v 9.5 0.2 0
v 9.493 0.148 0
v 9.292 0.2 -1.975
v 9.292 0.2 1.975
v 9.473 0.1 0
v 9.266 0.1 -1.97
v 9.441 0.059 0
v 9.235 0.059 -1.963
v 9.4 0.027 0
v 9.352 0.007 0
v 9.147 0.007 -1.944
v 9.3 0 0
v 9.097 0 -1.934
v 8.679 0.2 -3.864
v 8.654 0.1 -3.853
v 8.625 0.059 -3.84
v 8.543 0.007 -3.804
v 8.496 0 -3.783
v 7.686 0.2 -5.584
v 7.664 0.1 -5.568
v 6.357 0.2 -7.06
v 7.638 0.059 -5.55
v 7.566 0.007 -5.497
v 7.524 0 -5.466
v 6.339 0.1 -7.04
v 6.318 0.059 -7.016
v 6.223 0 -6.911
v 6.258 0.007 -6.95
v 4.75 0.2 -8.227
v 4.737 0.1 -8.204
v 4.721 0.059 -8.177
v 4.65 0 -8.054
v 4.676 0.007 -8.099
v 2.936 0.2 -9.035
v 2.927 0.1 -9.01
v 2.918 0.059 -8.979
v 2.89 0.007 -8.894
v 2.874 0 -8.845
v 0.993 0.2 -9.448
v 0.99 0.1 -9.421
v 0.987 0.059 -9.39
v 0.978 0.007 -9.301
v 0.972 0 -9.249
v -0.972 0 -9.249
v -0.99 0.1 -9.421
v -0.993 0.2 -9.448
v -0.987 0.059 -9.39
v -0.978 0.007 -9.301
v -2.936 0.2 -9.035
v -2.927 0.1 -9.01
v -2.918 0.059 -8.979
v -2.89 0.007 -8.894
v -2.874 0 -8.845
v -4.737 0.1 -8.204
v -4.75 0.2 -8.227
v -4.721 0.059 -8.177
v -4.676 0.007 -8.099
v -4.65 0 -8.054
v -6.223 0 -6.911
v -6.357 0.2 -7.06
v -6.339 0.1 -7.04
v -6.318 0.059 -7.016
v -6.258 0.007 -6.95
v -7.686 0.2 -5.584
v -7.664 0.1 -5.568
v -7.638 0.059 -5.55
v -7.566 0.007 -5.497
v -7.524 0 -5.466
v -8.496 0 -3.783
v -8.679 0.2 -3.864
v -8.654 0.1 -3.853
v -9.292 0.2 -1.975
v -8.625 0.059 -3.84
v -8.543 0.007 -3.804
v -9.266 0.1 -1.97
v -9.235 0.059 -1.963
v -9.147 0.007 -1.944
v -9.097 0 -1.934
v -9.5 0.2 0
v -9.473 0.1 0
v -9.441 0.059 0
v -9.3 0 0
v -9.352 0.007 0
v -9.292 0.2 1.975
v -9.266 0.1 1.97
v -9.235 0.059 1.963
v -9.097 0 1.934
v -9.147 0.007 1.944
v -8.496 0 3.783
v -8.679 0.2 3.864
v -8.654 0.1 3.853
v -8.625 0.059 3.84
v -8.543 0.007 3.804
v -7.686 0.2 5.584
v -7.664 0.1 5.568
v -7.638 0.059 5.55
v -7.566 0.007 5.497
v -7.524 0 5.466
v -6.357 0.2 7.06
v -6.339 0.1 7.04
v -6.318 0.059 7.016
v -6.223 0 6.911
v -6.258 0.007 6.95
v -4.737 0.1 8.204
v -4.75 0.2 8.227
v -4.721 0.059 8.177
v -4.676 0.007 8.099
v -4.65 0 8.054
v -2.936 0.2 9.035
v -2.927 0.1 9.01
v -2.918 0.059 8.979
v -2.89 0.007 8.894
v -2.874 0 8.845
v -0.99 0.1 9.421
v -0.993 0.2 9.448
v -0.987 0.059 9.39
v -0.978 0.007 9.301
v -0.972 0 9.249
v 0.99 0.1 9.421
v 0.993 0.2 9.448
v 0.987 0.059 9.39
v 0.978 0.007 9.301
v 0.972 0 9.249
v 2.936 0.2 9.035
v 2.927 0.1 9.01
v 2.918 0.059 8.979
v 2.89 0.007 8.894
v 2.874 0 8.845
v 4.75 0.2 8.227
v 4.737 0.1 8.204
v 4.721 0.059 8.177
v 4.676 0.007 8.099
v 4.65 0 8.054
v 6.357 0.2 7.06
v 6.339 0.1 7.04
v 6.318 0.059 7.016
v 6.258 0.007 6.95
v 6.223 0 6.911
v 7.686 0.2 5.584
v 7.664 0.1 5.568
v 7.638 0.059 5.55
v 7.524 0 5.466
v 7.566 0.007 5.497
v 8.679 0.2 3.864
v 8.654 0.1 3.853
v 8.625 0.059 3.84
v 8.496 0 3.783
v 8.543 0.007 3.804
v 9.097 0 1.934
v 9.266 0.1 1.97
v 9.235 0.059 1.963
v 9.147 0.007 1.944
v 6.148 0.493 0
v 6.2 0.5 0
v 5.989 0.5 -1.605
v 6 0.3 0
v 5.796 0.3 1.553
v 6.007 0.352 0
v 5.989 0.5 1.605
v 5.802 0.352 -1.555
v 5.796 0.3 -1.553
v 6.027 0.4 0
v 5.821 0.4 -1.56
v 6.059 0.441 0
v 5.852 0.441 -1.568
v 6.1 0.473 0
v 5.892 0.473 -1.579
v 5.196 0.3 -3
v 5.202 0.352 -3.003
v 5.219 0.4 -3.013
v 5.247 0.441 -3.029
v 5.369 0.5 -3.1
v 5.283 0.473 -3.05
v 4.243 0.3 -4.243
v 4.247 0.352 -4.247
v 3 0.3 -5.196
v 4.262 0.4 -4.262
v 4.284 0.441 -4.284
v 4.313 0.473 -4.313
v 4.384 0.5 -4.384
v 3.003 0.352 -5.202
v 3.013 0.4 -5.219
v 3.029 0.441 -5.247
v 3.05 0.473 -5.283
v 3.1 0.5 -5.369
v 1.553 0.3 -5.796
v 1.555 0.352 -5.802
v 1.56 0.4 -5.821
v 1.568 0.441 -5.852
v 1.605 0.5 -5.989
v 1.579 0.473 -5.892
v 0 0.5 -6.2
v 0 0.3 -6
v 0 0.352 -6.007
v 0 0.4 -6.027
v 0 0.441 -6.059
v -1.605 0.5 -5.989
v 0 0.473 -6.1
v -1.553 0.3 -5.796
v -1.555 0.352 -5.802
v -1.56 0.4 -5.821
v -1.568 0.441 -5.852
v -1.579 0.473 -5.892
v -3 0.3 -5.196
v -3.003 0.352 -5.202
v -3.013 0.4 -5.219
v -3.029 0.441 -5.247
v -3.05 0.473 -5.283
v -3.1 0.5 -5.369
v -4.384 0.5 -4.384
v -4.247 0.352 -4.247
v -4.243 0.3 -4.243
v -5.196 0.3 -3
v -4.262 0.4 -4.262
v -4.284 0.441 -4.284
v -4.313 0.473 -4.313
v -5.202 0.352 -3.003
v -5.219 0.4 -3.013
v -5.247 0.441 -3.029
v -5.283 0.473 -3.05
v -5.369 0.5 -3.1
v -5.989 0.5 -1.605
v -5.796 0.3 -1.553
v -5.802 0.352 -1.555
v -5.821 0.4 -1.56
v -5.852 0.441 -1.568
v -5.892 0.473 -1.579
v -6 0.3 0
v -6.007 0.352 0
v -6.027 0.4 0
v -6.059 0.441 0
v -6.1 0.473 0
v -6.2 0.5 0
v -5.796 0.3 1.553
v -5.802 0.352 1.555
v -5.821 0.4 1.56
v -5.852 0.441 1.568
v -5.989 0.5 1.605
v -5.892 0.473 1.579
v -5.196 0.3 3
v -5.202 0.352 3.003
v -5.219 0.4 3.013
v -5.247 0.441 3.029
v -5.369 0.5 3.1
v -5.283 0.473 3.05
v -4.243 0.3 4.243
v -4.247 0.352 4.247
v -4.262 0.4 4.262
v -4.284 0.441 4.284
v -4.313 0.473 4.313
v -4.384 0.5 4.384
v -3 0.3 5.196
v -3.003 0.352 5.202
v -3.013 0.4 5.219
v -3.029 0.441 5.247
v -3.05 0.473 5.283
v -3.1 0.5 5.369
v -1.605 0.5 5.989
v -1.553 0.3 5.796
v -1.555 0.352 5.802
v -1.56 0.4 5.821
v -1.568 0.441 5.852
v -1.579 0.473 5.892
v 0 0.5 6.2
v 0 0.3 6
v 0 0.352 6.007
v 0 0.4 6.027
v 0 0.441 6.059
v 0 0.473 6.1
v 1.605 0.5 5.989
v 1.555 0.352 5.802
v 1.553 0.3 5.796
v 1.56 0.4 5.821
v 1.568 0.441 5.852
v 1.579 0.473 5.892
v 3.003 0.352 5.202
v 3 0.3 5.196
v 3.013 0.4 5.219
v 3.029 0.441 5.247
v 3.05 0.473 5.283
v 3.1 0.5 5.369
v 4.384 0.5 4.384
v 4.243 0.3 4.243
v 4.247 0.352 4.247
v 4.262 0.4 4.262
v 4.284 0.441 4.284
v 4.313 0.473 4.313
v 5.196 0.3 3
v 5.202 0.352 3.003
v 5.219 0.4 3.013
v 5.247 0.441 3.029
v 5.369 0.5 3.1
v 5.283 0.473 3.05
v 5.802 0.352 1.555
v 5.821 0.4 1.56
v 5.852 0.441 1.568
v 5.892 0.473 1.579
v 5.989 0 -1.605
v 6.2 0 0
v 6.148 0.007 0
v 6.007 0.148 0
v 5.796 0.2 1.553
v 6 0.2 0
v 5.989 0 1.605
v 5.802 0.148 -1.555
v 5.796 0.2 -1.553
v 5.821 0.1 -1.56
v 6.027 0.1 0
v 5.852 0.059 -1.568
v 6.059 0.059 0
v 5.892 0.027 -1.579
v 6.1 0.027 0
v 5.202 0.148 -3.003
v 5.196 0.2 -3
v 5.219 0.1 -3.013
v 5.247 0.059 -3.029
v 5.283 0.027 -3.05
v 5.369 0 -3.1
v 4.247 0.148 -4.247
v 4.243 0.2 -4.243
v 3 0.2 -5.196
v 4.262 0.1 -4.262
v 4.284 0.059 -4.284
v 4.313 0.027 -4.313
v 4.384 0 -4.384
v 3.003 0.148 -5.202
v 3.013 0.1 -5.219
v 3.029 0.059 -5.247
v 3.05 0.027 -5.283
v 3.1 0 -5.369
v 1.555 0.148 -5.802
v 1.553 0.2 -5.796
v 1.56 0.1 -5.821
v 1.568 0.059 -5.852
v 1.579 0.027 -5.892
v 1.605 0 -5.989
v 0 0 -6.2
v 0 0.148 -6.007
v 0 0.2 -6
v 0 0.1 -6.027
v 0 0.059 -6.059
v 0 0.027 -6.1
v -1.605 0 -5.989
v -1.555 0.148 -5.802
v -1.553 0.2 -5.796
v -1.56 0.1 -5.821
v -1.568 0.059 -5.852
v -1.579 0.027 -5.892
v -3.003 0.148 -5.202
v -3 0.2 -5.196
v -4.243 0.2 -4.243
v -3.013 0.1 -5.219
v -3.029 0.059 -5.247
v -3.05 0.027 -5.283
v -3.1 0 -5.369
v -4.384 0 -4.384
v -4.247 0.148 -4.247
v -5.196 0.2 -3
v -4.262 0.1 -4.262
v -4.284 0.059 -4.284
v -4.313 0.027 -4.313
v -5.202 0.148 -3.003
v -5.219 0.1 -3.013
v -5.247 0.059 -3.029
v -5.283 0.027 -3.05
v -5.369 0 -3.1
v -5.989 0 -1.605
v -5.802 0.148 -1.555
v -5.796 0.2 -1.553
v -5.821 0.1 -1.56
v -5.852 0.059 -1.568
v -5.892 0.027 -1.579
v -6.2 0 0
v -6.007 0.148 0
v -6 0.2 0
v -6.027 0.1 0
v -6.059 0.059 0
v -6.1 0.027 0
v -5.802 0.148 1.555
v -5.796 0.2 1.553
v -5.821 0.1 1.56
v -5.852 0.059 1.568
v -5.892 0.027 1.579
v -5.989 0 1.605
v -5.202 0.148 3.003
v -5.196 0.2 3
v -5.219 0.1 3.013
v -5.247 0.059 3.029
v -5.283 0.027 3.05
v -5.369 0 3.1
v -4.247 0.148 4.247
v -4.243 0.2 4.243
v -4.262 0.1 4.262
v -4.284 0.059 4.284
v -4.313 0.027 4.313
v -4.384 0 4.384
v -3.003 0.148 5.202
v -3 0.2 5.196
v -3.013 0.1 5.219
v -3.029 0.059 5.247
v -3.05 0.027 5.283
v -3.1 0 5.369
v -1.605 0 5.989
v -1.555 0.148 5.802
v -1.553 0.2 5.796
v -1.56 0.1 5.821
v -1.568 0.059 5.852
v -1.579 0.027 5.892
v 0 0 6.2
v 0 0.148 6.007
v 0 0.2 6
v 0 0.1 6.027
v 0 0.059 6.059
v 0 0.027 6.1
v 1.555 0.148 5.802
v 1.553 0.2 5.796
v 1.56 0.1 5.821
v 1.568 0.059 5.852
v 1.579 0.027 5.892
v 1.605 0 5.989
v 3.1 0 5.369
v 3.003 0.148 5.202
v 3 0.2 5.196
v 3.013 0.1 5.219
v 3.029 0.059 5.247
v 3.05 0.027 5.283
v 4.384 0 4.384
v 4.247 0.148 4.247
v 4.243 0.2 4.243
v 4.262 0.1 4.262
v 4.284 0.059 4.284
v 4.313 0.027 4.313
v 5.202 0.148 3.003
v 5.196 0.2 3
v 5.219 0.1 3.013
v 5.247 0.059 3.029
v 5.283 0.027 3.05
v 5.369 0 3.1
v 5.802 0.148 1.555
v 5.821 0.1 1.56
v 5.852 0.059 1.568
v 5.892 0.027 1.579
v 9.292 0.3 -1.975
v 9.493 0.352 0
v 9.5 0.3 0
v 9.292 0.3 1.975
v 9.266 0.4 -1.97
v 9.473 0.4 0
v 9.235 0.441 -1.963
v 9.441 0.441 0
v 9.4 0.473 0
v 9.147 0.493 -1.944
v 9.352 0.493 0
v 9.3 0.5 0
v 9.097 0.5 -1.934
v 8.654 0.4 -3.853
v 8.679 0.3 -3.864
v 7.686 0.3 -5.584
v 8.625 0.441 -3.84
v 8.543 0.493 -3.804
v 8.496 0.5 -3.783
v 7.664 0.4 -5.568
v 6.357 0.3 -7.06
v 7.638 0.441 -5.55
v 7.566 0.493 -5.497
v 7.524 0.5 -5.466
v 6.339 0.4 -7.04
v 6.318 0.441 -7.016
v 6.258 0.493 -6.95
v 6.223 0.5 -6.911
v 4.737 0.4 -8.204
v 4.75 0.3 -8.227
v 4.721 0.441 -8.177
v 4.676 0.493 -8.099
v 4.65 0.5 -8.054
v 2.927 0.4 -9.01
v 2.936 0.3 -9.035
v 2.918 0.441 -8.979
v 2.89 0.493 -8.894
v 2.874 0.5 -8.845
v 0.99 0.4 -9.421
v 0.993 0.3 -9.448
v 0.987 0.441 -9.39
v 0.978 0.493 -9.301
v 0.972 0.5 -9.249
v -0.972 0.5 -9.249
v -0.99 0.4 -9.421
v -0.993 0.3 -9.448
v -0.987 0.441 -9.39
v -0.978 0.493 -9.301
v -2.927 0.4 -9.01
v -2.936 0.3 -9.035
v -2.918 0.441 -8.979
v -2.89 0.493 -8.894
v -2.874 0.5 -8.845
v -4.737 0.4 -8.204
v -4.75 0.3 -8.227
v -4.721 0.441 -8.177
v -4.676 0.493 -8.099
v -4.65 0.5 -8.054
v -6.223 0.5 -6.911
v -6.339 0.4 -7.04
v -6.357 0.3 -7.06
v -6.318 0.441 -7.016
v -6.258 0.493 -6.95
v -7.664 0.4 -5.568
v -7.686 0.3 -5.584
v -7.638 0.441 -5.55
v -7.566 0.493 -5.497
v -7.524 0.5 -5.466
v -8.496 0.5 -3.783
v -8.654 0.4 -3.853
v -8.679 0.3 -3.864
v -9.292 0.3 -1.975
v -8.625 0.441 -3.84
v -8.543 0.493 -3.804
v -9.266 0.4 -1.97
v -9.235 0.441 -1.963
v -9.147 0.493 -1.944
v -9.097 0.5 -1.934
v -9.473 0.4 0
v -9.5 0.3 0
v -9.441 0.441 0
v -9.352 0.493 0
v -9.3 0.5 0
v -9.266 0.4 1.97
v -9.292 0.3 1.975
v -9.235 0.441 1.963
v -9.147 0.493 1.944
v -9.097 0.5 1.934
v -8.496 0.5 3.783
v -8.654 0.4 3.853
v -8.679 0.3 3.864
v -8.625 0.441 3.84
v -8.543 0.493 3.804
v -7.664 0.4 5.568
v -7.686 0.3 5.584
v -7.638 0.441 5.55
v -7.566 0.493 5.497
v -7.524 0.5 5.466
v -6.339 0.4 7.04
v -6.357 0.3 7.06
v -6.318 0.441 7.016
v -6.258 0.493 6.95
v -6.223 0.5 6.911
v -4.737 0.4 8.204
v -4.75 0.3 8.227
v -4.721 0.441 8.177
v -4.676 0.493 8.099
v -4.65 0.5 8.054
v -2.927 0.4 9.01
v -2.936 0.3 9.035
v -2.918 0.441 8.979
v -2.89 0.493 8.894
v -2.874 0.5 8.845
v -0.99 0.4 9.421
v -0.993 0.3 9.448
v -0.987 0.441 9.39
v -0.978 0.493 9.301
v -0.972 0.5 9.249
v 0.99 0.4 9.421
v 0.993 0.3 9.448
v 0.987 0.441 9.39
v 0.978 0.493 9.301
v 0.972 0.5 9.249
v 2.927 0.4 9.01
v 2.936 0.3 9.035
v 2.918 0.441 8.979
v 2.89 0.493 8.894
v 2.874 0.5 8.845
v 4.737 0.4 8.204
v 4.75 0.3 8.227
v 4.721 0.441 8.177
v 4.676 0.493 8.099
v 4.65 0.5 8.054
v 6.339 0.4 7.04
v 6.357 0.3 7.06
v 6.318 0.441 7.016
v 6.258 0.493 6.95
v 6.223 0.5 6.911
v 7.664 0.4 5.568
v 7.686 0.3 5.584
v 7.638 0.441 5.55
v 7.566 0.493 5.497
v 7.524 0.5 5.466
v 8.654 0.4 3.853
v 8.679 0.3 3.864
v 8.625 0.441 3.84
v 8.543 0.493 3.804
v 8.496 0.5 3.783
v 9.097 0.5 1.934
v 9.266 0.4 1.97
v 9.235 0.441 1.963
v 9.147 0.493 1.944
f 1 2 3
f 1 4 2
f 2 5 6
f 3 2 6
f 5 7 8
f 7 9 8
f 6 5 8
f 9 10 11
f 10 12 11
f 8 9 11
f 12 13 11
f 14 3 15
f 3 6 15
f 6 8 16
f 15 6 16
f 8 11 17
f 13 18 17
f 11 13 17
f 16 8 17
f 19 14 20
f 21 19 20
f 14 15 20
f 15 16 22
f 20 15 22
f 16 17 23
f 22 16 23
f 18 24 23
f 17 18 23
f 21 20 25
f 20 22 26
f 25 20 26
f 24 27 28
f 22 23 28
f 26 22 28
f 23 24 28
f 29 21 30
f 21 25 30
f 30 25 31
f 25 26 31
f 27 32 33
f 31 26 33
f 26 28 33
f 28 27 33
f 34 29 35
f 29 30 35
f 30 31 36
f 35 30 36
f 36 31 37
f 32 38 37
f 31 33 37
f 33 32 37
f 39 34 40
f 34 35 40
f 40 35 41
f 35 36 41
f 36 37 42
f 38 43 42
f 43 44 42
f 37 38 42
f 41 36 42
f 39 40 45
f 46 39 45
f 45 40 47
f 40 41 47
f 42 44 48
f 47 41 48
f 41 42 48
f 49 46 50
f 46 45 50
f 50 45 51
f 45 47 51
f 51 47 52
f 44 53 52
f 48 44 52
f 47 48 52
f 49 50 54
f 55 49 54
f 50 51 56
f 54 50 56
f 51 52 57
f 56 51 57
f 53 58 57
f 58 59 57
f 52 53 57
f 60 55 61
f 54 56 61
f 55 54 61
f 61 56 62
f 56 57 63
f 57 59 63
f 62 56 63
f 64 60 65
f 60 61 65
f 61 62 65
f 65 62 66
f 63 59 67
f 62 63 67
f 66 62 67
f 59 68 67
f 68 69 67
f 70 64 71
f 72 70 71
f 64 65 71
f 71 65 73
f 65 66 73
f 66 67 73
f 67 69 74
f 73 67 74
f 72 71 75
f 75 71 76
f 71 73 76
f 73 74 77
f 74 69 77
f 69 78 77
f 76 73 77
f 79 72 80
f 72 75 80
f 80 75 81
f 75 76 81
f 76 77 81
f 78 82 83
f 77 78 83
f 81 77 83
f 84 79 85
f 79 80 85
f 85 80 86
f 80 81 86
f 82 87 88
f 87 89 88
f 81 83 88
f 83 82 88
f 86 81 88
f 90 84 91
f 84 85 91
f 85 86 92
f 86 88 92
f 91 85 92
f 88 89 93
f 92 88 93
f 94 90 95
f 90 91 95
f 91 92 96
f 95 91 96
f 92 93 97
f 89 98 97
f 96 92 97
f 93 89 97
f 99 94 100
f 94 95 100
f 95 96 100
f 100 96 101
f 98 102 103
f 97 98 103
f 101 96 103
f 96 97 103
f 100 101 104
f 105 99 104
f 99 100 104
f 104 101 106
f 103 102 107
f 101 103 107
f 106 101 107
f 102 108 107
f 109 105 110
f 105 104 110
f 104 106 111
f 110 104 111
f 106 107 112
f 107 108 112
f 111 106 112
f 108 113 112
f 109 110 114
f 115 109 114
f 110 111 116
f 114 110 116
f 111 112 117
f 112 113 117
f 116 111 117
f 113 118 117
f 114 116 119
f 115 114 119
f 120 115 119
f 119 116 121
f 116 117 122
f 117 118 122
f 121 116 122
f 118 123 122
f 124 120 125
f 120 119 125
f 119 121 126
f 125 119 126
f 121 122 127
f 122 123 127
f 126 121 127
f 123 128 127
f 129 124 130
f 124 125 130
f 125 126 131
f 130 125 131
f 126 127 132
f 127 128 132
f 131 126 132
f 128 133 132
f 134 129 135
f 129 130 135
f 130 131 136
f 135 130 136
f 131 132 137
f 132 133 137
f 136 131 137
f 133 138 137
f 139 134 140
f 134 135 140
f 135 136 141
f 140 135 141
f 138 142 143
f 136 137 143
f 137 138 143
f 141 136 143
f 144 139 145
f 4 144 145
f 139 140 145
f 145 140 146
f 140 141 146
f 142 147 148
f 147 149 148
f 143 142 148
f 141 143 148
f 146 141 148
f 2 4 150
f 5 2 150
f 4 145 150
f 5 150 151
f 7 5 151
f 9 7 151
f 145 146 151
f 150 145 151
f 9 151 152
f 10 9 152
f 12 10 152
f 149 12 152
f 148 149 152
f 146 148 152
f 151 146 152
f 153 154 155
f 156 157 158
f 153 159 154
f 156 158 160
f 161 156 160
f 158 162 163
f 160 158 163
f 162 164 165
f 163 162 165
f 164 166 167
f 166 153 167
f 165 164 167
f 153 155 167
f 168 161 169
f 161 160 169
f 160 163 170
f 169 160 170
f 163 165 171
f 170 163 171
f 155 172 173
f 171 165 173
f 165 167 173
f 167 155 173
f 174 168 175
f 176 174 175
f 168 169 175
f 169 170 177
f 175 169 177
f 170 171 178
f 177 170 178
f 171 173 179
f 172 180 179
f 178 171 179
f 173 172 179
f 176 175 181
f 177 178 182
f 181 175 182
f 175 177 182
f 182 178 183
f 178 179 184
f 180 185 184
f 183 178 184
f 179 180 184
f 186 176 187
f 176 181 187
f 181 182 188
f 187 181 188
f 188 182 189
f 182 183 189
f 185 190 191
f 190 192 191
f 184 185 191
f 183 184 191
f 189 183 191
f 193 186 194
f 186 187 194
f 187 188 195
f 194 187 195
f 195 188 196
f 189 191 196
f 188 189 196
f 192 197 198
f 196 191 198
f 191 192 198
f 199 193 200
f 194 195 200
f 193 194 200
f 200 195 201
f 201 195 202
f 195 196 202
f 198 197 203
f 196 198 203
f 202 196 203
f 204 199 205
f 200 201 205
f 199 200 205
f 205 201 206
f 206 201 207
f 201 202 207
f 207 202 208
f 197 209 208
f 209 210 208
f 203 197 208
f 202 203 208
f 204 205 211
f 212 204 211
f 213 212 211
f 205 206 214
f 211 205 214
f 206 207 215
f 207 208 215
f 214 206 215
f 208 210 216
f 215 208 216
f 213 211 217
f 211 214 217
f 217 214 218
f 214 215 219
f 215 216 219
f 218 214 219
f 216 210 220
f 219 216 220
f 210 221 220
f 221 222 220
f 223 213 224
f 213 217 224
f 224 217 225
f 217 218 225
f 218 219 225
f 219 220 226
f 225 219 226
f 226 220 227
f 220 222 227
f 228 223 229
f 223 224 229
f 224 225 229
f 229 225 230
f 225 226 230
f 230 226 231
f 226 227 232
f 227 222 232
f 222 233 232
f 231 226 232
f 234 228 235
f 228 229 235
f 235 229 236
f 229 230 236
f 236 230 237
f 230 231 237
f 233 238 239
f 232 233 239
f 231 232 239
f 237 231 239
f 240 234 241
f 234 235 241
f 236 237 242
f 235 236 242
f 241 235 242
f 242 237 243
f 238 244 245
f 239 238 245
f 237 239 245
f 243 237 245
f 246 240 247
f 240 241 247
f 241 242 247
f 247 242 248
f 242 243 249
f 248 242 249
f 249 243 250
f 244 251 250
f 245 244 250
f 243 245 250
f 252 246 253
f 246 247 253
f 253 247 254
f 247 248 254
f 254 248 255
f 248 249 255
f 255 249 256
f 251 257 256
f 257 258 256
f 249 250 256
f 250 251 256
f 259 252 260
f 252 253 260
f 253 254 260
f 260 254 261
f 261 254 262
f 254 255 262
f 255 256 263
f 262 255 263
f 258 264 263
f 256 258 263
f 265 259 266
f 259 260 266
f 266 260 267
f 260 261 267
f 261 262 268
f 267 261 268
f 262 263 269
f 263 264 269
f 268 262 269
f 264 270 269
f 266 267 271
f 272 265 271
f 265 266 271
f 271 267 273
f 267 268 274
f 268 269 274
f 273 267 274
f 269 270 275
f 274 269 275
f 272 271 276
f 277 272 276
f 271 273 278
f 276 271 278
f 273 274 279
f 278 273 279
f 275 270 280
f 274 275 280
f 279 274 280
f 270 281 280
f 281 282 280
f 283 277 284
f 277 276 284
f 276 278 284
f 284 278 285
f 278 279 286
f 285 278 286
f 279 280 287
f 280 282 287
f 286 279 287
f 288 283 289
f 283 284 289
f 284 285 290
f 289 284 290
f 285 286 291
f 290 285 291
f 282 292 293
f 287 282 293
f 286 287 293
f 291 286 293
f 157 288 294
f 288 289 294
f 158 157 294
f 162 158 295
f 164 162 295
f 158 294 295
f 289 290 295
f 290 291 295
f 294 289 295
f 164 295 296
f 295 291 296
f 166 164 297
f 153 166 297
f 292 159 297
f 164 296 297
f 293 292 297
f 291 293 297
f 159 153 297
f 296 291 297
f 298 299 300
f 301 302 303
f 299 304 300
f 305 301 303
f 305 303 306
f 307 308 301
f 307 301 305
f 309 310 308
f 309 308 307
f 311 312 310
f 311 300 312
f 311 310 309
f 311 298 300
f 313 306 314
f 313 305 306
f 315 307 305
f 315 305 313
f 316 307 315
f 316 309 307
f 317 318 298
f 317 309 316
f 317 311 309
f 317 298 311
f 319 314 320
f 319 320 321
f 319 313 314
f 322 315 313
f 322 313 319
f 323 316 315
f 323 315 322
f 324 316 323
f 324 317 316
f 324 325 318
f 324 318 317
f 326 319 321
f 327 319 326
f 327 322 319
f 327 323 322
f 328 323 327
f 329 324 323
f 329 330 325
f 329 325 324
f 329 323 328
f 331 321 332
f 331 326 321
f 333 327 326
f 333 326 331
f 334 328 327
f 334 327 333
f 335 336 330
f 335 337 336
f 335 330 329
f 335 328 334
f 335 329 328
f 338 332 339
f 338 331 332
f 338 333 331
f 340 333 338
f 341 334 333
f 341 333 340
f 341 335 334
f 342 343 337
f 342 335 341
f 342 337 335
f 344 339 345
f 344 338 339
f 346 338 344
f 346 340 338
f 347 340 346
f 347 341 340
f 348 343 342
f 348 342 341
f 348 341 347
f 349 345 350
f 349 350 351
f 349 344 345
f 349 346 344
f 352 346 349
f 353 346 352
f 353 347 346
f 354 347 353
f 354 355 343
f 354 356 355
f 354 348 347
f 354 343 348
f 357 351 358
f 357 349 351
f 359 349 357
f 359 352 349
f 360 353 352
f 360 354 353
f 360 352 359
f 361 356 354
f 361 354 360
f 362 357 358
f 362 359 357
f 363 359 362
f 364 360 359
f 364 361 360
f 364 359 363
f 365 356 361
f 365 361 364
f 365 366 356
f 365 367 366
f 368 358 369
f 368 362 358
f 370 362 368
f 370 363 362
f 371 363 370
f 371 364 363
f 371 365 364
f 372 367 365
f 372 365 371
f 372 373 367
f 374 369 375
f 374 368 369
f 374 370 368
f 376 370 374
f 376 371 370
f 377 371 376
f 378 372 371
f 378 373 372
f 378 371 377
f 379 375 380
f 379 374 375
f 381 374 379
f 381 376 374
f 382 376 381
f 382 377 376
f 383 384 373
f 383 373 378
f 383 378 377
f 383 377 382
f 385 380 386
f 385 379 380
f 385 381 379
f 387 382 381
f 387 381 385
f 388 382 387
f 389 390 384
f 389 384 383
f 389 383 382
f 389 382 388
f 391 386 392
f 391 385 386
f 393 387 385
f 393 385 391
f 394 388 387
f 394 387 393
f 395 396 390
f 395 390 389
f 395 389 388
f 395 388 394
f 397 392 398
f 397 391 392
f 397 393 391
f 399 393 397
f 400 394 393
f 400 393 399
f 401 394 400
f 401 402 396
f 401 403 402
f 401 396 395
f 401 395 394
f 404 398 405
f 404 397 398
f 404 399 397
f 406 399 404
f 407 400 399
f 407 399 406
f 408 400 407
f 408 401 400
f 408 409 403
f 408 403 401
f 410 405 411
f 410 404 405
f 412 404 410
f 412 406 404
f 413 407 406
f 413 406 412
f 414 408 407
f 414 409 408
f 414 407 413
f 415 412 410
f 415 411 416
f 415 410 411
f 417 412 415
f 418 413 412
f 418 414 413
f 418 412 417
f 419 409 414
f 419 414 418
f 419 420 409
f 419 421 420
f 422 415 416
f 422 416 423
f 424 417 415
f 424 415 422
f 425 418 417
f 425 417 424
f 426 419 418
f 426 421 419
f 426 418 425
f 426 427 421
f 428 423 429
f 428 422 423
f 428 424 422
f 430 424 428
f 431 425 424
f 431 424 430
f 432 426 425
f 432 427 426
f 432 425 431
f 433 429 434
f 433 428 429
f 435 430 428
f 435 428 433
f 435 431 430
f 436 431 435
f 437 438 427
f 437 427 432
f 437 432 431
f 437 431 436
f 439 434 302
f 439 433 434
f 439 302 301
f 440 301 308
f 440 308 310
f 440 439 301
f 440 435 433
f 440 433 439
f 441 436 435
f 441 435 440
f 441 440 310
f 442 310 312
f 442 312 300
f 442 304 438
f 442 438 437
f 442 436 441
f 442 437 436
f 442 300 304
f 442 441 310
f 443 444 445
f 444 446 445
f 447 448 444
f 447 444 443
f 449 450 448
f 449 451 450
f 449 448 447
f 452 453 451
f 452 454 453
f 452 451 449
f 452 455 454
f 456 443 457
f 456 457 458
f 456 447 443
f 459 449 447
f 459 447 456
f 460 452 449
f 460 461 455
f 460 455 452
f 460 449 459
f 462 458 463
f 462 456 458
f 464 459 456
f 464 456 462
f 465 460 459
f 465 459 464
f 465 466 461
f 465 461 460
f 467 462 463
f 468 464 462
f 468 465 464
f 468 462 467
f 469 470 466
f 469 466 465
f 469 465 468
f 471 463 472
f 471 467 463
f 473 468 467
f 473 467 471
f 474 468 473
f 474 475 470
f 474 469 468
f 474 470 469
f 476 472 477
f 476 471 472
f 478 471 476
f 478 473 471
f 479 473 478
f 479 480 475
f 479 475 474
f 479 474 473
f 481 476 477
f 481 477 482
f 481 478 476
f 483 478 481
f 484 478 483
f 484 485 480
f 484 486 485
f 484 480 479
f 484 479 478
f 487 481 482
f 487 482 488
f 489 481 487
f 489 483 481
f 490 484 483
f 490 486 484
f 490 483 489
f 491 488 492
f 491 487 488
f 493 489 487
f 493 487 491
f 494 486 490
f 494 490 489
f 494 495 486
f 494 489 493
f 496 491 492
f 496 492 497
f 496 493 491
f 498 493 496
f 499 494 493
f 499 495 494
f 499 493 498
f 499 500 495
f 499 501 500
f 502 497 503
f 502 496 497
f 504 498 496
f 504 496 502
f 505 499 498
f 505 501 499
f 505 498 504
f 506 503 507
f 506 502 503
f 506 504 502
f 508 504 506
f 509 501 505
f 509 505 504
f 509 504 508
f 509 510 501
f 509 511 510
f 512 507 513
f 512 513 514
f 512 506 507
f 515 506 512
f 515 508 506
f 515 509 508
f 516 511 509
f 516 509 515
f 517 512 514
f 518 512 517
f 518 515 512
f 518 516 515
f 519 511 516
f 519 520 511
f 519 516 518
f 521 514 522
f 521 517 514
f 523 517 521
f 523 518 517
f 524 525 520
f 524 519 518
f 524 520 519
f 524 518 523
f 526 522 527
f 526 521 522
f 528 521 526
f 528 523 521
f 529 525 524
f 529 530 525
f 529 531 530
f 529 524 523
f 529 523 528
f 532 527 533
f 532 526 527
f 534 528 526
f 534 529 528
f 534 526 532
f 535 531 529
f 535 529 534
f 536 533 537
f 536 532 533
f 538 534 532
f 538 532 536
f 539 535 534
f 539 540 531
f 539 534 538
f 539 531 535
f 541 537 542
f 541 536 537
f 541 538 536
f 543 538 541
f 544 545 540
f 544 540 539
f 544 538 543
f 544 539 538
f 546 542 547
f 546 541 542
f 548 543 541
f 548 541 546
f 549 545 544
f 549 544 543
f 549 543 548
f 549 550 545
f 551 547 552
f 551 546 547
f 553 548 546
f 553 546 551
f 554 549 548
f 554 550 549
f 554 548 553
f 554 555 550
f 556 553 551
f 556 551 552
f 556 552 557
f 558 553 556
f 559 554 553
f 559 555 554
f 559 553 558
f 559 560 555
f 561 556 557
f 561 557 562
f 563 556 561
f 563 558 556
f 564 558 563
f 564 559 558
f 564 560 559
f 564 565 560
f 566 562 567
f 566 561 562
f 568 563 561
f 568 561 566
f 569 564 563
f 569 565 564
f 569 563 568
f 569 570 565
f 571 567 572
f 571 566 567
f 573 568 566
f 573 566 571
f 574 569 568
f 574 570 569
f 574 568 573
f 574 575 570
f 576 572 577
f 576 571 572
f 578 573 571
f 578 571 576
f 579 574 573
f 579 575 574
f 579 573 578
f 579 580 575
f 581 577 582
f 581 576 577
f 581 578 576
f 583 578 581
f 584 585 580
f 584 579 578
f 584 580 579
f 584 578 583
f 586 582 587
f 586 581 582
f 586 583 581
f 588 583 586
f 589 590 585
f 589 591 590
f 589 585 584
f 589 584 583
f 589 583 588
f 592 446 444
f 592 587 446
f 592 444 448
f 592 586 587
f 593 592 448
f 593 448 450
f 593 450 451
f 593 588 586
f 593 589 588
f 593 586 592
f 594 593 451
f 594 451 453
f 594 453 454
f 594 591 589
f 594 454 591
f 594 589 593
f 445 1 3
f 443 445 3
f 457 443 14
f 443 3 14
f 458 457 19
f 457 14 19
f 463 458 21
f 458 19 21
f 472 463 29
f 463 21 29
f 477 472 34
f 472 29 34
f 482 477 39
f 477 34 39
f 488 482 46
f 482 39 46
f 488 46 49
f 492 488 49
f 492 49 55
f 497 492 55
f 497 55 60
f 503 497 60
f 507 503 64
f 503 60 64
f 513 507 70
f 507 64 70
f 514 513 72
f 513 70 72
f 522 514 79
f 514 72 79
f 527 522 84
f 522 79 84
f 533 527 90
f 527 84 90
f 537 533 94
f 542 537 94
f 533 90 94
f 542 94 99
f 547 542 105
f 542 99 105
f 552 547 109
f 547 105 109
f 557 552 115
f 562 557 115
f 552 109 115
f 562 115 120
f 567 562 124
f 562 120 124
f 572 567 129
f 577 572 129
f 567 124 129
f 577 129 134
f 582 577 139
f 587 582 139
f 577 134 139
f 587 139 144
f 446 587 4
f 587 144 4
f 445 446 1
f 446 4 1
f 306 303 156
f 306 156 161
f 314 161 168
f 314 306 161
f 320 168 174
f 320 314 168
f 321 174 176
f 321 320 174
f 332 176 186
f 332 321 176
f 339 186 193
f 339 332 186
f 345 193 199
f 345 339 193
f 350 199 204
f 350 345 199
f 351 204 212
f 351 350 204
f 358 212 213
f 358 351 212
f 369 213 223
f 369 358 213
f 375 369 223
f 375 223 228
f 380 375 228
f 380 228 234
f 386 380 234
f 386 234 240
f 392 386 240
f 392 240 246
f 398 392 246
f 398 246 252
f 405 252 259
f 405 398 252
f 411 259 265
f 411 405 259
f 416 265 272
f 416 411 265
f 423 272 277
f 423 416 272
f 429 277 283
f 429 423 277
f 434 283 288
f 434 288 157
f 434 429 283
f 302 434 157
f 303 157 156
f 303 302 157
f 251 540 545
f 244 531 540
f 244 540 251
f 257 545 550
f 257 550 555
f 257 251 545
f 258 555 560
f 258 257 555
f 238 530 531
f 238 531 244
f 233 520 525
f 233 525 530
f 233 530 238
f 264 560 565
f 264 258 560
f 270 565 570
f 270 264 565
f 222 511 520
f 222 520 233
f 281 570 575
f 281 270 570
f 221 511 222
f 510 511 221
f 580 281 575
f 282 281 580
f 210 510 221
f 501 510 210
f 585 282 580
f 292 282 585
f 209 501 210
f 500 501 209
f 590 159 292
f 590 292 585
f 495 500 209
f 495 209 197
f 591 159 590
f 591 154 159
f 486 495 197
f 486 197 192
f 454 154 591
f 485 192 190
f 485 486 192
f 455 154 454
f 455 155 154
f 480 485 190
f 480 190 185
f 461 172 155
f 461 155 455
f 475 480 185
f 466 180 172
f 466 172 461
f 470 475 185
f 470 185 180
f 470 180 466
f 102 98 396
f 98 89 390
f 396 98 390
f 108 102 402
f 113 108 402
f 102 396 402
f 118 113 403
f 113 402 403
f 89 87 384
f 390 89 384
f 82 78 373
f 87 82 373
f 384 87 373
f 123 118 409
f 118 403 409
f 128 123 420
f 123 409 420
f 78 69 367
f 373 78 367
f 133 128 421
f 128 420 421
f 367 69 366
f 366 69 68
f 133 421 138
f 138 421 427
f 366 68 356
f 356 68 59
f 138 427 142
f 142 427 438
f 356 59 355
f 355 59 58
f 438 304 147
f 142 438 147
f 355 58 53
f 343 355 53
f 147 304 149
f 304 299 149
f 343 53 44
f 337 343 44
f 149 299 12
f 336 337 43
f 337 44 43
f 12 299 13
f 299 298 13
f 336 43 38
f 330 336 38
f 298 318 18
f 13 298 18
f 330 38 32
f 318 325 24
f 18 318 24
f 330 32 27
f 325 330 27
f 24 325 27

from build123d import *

# Parameters (mm, degrees)
SKETCH1_R           = 9.5
SKETCH1_R_2         = 6
BOSS_EXTRUDE1_DEPTH = 0.5
FILLET1_R           = 0.2


with BuildPart() as part:
    # Sketch1 → Boss-Extrude1 (new body)
    with BuildSketch(Plane(origin=(0, 0, 0), x_dir=(1, 0, 0), z_dir=(0, 1, 0))):
        Circle(SKETCH1_R)
        Circle(SKETCH1_R_2, mode=Mode.SUBTRACT)
    extrude(amount=BOSS_EXTRUDE1_DEPTH)

    # Fillet1
    fillet1_edges = [part.edges().sort_by_distance(p)[0] for p in [
        (-9.5, 0, 0),
        (-9.5, 0.5, 0),
        (-6, 0, 0),
        (-6, 0.5, 0),
    ]]
    fillet(fillet1_edges, radius=FILLET1_R)


solid = part.part
